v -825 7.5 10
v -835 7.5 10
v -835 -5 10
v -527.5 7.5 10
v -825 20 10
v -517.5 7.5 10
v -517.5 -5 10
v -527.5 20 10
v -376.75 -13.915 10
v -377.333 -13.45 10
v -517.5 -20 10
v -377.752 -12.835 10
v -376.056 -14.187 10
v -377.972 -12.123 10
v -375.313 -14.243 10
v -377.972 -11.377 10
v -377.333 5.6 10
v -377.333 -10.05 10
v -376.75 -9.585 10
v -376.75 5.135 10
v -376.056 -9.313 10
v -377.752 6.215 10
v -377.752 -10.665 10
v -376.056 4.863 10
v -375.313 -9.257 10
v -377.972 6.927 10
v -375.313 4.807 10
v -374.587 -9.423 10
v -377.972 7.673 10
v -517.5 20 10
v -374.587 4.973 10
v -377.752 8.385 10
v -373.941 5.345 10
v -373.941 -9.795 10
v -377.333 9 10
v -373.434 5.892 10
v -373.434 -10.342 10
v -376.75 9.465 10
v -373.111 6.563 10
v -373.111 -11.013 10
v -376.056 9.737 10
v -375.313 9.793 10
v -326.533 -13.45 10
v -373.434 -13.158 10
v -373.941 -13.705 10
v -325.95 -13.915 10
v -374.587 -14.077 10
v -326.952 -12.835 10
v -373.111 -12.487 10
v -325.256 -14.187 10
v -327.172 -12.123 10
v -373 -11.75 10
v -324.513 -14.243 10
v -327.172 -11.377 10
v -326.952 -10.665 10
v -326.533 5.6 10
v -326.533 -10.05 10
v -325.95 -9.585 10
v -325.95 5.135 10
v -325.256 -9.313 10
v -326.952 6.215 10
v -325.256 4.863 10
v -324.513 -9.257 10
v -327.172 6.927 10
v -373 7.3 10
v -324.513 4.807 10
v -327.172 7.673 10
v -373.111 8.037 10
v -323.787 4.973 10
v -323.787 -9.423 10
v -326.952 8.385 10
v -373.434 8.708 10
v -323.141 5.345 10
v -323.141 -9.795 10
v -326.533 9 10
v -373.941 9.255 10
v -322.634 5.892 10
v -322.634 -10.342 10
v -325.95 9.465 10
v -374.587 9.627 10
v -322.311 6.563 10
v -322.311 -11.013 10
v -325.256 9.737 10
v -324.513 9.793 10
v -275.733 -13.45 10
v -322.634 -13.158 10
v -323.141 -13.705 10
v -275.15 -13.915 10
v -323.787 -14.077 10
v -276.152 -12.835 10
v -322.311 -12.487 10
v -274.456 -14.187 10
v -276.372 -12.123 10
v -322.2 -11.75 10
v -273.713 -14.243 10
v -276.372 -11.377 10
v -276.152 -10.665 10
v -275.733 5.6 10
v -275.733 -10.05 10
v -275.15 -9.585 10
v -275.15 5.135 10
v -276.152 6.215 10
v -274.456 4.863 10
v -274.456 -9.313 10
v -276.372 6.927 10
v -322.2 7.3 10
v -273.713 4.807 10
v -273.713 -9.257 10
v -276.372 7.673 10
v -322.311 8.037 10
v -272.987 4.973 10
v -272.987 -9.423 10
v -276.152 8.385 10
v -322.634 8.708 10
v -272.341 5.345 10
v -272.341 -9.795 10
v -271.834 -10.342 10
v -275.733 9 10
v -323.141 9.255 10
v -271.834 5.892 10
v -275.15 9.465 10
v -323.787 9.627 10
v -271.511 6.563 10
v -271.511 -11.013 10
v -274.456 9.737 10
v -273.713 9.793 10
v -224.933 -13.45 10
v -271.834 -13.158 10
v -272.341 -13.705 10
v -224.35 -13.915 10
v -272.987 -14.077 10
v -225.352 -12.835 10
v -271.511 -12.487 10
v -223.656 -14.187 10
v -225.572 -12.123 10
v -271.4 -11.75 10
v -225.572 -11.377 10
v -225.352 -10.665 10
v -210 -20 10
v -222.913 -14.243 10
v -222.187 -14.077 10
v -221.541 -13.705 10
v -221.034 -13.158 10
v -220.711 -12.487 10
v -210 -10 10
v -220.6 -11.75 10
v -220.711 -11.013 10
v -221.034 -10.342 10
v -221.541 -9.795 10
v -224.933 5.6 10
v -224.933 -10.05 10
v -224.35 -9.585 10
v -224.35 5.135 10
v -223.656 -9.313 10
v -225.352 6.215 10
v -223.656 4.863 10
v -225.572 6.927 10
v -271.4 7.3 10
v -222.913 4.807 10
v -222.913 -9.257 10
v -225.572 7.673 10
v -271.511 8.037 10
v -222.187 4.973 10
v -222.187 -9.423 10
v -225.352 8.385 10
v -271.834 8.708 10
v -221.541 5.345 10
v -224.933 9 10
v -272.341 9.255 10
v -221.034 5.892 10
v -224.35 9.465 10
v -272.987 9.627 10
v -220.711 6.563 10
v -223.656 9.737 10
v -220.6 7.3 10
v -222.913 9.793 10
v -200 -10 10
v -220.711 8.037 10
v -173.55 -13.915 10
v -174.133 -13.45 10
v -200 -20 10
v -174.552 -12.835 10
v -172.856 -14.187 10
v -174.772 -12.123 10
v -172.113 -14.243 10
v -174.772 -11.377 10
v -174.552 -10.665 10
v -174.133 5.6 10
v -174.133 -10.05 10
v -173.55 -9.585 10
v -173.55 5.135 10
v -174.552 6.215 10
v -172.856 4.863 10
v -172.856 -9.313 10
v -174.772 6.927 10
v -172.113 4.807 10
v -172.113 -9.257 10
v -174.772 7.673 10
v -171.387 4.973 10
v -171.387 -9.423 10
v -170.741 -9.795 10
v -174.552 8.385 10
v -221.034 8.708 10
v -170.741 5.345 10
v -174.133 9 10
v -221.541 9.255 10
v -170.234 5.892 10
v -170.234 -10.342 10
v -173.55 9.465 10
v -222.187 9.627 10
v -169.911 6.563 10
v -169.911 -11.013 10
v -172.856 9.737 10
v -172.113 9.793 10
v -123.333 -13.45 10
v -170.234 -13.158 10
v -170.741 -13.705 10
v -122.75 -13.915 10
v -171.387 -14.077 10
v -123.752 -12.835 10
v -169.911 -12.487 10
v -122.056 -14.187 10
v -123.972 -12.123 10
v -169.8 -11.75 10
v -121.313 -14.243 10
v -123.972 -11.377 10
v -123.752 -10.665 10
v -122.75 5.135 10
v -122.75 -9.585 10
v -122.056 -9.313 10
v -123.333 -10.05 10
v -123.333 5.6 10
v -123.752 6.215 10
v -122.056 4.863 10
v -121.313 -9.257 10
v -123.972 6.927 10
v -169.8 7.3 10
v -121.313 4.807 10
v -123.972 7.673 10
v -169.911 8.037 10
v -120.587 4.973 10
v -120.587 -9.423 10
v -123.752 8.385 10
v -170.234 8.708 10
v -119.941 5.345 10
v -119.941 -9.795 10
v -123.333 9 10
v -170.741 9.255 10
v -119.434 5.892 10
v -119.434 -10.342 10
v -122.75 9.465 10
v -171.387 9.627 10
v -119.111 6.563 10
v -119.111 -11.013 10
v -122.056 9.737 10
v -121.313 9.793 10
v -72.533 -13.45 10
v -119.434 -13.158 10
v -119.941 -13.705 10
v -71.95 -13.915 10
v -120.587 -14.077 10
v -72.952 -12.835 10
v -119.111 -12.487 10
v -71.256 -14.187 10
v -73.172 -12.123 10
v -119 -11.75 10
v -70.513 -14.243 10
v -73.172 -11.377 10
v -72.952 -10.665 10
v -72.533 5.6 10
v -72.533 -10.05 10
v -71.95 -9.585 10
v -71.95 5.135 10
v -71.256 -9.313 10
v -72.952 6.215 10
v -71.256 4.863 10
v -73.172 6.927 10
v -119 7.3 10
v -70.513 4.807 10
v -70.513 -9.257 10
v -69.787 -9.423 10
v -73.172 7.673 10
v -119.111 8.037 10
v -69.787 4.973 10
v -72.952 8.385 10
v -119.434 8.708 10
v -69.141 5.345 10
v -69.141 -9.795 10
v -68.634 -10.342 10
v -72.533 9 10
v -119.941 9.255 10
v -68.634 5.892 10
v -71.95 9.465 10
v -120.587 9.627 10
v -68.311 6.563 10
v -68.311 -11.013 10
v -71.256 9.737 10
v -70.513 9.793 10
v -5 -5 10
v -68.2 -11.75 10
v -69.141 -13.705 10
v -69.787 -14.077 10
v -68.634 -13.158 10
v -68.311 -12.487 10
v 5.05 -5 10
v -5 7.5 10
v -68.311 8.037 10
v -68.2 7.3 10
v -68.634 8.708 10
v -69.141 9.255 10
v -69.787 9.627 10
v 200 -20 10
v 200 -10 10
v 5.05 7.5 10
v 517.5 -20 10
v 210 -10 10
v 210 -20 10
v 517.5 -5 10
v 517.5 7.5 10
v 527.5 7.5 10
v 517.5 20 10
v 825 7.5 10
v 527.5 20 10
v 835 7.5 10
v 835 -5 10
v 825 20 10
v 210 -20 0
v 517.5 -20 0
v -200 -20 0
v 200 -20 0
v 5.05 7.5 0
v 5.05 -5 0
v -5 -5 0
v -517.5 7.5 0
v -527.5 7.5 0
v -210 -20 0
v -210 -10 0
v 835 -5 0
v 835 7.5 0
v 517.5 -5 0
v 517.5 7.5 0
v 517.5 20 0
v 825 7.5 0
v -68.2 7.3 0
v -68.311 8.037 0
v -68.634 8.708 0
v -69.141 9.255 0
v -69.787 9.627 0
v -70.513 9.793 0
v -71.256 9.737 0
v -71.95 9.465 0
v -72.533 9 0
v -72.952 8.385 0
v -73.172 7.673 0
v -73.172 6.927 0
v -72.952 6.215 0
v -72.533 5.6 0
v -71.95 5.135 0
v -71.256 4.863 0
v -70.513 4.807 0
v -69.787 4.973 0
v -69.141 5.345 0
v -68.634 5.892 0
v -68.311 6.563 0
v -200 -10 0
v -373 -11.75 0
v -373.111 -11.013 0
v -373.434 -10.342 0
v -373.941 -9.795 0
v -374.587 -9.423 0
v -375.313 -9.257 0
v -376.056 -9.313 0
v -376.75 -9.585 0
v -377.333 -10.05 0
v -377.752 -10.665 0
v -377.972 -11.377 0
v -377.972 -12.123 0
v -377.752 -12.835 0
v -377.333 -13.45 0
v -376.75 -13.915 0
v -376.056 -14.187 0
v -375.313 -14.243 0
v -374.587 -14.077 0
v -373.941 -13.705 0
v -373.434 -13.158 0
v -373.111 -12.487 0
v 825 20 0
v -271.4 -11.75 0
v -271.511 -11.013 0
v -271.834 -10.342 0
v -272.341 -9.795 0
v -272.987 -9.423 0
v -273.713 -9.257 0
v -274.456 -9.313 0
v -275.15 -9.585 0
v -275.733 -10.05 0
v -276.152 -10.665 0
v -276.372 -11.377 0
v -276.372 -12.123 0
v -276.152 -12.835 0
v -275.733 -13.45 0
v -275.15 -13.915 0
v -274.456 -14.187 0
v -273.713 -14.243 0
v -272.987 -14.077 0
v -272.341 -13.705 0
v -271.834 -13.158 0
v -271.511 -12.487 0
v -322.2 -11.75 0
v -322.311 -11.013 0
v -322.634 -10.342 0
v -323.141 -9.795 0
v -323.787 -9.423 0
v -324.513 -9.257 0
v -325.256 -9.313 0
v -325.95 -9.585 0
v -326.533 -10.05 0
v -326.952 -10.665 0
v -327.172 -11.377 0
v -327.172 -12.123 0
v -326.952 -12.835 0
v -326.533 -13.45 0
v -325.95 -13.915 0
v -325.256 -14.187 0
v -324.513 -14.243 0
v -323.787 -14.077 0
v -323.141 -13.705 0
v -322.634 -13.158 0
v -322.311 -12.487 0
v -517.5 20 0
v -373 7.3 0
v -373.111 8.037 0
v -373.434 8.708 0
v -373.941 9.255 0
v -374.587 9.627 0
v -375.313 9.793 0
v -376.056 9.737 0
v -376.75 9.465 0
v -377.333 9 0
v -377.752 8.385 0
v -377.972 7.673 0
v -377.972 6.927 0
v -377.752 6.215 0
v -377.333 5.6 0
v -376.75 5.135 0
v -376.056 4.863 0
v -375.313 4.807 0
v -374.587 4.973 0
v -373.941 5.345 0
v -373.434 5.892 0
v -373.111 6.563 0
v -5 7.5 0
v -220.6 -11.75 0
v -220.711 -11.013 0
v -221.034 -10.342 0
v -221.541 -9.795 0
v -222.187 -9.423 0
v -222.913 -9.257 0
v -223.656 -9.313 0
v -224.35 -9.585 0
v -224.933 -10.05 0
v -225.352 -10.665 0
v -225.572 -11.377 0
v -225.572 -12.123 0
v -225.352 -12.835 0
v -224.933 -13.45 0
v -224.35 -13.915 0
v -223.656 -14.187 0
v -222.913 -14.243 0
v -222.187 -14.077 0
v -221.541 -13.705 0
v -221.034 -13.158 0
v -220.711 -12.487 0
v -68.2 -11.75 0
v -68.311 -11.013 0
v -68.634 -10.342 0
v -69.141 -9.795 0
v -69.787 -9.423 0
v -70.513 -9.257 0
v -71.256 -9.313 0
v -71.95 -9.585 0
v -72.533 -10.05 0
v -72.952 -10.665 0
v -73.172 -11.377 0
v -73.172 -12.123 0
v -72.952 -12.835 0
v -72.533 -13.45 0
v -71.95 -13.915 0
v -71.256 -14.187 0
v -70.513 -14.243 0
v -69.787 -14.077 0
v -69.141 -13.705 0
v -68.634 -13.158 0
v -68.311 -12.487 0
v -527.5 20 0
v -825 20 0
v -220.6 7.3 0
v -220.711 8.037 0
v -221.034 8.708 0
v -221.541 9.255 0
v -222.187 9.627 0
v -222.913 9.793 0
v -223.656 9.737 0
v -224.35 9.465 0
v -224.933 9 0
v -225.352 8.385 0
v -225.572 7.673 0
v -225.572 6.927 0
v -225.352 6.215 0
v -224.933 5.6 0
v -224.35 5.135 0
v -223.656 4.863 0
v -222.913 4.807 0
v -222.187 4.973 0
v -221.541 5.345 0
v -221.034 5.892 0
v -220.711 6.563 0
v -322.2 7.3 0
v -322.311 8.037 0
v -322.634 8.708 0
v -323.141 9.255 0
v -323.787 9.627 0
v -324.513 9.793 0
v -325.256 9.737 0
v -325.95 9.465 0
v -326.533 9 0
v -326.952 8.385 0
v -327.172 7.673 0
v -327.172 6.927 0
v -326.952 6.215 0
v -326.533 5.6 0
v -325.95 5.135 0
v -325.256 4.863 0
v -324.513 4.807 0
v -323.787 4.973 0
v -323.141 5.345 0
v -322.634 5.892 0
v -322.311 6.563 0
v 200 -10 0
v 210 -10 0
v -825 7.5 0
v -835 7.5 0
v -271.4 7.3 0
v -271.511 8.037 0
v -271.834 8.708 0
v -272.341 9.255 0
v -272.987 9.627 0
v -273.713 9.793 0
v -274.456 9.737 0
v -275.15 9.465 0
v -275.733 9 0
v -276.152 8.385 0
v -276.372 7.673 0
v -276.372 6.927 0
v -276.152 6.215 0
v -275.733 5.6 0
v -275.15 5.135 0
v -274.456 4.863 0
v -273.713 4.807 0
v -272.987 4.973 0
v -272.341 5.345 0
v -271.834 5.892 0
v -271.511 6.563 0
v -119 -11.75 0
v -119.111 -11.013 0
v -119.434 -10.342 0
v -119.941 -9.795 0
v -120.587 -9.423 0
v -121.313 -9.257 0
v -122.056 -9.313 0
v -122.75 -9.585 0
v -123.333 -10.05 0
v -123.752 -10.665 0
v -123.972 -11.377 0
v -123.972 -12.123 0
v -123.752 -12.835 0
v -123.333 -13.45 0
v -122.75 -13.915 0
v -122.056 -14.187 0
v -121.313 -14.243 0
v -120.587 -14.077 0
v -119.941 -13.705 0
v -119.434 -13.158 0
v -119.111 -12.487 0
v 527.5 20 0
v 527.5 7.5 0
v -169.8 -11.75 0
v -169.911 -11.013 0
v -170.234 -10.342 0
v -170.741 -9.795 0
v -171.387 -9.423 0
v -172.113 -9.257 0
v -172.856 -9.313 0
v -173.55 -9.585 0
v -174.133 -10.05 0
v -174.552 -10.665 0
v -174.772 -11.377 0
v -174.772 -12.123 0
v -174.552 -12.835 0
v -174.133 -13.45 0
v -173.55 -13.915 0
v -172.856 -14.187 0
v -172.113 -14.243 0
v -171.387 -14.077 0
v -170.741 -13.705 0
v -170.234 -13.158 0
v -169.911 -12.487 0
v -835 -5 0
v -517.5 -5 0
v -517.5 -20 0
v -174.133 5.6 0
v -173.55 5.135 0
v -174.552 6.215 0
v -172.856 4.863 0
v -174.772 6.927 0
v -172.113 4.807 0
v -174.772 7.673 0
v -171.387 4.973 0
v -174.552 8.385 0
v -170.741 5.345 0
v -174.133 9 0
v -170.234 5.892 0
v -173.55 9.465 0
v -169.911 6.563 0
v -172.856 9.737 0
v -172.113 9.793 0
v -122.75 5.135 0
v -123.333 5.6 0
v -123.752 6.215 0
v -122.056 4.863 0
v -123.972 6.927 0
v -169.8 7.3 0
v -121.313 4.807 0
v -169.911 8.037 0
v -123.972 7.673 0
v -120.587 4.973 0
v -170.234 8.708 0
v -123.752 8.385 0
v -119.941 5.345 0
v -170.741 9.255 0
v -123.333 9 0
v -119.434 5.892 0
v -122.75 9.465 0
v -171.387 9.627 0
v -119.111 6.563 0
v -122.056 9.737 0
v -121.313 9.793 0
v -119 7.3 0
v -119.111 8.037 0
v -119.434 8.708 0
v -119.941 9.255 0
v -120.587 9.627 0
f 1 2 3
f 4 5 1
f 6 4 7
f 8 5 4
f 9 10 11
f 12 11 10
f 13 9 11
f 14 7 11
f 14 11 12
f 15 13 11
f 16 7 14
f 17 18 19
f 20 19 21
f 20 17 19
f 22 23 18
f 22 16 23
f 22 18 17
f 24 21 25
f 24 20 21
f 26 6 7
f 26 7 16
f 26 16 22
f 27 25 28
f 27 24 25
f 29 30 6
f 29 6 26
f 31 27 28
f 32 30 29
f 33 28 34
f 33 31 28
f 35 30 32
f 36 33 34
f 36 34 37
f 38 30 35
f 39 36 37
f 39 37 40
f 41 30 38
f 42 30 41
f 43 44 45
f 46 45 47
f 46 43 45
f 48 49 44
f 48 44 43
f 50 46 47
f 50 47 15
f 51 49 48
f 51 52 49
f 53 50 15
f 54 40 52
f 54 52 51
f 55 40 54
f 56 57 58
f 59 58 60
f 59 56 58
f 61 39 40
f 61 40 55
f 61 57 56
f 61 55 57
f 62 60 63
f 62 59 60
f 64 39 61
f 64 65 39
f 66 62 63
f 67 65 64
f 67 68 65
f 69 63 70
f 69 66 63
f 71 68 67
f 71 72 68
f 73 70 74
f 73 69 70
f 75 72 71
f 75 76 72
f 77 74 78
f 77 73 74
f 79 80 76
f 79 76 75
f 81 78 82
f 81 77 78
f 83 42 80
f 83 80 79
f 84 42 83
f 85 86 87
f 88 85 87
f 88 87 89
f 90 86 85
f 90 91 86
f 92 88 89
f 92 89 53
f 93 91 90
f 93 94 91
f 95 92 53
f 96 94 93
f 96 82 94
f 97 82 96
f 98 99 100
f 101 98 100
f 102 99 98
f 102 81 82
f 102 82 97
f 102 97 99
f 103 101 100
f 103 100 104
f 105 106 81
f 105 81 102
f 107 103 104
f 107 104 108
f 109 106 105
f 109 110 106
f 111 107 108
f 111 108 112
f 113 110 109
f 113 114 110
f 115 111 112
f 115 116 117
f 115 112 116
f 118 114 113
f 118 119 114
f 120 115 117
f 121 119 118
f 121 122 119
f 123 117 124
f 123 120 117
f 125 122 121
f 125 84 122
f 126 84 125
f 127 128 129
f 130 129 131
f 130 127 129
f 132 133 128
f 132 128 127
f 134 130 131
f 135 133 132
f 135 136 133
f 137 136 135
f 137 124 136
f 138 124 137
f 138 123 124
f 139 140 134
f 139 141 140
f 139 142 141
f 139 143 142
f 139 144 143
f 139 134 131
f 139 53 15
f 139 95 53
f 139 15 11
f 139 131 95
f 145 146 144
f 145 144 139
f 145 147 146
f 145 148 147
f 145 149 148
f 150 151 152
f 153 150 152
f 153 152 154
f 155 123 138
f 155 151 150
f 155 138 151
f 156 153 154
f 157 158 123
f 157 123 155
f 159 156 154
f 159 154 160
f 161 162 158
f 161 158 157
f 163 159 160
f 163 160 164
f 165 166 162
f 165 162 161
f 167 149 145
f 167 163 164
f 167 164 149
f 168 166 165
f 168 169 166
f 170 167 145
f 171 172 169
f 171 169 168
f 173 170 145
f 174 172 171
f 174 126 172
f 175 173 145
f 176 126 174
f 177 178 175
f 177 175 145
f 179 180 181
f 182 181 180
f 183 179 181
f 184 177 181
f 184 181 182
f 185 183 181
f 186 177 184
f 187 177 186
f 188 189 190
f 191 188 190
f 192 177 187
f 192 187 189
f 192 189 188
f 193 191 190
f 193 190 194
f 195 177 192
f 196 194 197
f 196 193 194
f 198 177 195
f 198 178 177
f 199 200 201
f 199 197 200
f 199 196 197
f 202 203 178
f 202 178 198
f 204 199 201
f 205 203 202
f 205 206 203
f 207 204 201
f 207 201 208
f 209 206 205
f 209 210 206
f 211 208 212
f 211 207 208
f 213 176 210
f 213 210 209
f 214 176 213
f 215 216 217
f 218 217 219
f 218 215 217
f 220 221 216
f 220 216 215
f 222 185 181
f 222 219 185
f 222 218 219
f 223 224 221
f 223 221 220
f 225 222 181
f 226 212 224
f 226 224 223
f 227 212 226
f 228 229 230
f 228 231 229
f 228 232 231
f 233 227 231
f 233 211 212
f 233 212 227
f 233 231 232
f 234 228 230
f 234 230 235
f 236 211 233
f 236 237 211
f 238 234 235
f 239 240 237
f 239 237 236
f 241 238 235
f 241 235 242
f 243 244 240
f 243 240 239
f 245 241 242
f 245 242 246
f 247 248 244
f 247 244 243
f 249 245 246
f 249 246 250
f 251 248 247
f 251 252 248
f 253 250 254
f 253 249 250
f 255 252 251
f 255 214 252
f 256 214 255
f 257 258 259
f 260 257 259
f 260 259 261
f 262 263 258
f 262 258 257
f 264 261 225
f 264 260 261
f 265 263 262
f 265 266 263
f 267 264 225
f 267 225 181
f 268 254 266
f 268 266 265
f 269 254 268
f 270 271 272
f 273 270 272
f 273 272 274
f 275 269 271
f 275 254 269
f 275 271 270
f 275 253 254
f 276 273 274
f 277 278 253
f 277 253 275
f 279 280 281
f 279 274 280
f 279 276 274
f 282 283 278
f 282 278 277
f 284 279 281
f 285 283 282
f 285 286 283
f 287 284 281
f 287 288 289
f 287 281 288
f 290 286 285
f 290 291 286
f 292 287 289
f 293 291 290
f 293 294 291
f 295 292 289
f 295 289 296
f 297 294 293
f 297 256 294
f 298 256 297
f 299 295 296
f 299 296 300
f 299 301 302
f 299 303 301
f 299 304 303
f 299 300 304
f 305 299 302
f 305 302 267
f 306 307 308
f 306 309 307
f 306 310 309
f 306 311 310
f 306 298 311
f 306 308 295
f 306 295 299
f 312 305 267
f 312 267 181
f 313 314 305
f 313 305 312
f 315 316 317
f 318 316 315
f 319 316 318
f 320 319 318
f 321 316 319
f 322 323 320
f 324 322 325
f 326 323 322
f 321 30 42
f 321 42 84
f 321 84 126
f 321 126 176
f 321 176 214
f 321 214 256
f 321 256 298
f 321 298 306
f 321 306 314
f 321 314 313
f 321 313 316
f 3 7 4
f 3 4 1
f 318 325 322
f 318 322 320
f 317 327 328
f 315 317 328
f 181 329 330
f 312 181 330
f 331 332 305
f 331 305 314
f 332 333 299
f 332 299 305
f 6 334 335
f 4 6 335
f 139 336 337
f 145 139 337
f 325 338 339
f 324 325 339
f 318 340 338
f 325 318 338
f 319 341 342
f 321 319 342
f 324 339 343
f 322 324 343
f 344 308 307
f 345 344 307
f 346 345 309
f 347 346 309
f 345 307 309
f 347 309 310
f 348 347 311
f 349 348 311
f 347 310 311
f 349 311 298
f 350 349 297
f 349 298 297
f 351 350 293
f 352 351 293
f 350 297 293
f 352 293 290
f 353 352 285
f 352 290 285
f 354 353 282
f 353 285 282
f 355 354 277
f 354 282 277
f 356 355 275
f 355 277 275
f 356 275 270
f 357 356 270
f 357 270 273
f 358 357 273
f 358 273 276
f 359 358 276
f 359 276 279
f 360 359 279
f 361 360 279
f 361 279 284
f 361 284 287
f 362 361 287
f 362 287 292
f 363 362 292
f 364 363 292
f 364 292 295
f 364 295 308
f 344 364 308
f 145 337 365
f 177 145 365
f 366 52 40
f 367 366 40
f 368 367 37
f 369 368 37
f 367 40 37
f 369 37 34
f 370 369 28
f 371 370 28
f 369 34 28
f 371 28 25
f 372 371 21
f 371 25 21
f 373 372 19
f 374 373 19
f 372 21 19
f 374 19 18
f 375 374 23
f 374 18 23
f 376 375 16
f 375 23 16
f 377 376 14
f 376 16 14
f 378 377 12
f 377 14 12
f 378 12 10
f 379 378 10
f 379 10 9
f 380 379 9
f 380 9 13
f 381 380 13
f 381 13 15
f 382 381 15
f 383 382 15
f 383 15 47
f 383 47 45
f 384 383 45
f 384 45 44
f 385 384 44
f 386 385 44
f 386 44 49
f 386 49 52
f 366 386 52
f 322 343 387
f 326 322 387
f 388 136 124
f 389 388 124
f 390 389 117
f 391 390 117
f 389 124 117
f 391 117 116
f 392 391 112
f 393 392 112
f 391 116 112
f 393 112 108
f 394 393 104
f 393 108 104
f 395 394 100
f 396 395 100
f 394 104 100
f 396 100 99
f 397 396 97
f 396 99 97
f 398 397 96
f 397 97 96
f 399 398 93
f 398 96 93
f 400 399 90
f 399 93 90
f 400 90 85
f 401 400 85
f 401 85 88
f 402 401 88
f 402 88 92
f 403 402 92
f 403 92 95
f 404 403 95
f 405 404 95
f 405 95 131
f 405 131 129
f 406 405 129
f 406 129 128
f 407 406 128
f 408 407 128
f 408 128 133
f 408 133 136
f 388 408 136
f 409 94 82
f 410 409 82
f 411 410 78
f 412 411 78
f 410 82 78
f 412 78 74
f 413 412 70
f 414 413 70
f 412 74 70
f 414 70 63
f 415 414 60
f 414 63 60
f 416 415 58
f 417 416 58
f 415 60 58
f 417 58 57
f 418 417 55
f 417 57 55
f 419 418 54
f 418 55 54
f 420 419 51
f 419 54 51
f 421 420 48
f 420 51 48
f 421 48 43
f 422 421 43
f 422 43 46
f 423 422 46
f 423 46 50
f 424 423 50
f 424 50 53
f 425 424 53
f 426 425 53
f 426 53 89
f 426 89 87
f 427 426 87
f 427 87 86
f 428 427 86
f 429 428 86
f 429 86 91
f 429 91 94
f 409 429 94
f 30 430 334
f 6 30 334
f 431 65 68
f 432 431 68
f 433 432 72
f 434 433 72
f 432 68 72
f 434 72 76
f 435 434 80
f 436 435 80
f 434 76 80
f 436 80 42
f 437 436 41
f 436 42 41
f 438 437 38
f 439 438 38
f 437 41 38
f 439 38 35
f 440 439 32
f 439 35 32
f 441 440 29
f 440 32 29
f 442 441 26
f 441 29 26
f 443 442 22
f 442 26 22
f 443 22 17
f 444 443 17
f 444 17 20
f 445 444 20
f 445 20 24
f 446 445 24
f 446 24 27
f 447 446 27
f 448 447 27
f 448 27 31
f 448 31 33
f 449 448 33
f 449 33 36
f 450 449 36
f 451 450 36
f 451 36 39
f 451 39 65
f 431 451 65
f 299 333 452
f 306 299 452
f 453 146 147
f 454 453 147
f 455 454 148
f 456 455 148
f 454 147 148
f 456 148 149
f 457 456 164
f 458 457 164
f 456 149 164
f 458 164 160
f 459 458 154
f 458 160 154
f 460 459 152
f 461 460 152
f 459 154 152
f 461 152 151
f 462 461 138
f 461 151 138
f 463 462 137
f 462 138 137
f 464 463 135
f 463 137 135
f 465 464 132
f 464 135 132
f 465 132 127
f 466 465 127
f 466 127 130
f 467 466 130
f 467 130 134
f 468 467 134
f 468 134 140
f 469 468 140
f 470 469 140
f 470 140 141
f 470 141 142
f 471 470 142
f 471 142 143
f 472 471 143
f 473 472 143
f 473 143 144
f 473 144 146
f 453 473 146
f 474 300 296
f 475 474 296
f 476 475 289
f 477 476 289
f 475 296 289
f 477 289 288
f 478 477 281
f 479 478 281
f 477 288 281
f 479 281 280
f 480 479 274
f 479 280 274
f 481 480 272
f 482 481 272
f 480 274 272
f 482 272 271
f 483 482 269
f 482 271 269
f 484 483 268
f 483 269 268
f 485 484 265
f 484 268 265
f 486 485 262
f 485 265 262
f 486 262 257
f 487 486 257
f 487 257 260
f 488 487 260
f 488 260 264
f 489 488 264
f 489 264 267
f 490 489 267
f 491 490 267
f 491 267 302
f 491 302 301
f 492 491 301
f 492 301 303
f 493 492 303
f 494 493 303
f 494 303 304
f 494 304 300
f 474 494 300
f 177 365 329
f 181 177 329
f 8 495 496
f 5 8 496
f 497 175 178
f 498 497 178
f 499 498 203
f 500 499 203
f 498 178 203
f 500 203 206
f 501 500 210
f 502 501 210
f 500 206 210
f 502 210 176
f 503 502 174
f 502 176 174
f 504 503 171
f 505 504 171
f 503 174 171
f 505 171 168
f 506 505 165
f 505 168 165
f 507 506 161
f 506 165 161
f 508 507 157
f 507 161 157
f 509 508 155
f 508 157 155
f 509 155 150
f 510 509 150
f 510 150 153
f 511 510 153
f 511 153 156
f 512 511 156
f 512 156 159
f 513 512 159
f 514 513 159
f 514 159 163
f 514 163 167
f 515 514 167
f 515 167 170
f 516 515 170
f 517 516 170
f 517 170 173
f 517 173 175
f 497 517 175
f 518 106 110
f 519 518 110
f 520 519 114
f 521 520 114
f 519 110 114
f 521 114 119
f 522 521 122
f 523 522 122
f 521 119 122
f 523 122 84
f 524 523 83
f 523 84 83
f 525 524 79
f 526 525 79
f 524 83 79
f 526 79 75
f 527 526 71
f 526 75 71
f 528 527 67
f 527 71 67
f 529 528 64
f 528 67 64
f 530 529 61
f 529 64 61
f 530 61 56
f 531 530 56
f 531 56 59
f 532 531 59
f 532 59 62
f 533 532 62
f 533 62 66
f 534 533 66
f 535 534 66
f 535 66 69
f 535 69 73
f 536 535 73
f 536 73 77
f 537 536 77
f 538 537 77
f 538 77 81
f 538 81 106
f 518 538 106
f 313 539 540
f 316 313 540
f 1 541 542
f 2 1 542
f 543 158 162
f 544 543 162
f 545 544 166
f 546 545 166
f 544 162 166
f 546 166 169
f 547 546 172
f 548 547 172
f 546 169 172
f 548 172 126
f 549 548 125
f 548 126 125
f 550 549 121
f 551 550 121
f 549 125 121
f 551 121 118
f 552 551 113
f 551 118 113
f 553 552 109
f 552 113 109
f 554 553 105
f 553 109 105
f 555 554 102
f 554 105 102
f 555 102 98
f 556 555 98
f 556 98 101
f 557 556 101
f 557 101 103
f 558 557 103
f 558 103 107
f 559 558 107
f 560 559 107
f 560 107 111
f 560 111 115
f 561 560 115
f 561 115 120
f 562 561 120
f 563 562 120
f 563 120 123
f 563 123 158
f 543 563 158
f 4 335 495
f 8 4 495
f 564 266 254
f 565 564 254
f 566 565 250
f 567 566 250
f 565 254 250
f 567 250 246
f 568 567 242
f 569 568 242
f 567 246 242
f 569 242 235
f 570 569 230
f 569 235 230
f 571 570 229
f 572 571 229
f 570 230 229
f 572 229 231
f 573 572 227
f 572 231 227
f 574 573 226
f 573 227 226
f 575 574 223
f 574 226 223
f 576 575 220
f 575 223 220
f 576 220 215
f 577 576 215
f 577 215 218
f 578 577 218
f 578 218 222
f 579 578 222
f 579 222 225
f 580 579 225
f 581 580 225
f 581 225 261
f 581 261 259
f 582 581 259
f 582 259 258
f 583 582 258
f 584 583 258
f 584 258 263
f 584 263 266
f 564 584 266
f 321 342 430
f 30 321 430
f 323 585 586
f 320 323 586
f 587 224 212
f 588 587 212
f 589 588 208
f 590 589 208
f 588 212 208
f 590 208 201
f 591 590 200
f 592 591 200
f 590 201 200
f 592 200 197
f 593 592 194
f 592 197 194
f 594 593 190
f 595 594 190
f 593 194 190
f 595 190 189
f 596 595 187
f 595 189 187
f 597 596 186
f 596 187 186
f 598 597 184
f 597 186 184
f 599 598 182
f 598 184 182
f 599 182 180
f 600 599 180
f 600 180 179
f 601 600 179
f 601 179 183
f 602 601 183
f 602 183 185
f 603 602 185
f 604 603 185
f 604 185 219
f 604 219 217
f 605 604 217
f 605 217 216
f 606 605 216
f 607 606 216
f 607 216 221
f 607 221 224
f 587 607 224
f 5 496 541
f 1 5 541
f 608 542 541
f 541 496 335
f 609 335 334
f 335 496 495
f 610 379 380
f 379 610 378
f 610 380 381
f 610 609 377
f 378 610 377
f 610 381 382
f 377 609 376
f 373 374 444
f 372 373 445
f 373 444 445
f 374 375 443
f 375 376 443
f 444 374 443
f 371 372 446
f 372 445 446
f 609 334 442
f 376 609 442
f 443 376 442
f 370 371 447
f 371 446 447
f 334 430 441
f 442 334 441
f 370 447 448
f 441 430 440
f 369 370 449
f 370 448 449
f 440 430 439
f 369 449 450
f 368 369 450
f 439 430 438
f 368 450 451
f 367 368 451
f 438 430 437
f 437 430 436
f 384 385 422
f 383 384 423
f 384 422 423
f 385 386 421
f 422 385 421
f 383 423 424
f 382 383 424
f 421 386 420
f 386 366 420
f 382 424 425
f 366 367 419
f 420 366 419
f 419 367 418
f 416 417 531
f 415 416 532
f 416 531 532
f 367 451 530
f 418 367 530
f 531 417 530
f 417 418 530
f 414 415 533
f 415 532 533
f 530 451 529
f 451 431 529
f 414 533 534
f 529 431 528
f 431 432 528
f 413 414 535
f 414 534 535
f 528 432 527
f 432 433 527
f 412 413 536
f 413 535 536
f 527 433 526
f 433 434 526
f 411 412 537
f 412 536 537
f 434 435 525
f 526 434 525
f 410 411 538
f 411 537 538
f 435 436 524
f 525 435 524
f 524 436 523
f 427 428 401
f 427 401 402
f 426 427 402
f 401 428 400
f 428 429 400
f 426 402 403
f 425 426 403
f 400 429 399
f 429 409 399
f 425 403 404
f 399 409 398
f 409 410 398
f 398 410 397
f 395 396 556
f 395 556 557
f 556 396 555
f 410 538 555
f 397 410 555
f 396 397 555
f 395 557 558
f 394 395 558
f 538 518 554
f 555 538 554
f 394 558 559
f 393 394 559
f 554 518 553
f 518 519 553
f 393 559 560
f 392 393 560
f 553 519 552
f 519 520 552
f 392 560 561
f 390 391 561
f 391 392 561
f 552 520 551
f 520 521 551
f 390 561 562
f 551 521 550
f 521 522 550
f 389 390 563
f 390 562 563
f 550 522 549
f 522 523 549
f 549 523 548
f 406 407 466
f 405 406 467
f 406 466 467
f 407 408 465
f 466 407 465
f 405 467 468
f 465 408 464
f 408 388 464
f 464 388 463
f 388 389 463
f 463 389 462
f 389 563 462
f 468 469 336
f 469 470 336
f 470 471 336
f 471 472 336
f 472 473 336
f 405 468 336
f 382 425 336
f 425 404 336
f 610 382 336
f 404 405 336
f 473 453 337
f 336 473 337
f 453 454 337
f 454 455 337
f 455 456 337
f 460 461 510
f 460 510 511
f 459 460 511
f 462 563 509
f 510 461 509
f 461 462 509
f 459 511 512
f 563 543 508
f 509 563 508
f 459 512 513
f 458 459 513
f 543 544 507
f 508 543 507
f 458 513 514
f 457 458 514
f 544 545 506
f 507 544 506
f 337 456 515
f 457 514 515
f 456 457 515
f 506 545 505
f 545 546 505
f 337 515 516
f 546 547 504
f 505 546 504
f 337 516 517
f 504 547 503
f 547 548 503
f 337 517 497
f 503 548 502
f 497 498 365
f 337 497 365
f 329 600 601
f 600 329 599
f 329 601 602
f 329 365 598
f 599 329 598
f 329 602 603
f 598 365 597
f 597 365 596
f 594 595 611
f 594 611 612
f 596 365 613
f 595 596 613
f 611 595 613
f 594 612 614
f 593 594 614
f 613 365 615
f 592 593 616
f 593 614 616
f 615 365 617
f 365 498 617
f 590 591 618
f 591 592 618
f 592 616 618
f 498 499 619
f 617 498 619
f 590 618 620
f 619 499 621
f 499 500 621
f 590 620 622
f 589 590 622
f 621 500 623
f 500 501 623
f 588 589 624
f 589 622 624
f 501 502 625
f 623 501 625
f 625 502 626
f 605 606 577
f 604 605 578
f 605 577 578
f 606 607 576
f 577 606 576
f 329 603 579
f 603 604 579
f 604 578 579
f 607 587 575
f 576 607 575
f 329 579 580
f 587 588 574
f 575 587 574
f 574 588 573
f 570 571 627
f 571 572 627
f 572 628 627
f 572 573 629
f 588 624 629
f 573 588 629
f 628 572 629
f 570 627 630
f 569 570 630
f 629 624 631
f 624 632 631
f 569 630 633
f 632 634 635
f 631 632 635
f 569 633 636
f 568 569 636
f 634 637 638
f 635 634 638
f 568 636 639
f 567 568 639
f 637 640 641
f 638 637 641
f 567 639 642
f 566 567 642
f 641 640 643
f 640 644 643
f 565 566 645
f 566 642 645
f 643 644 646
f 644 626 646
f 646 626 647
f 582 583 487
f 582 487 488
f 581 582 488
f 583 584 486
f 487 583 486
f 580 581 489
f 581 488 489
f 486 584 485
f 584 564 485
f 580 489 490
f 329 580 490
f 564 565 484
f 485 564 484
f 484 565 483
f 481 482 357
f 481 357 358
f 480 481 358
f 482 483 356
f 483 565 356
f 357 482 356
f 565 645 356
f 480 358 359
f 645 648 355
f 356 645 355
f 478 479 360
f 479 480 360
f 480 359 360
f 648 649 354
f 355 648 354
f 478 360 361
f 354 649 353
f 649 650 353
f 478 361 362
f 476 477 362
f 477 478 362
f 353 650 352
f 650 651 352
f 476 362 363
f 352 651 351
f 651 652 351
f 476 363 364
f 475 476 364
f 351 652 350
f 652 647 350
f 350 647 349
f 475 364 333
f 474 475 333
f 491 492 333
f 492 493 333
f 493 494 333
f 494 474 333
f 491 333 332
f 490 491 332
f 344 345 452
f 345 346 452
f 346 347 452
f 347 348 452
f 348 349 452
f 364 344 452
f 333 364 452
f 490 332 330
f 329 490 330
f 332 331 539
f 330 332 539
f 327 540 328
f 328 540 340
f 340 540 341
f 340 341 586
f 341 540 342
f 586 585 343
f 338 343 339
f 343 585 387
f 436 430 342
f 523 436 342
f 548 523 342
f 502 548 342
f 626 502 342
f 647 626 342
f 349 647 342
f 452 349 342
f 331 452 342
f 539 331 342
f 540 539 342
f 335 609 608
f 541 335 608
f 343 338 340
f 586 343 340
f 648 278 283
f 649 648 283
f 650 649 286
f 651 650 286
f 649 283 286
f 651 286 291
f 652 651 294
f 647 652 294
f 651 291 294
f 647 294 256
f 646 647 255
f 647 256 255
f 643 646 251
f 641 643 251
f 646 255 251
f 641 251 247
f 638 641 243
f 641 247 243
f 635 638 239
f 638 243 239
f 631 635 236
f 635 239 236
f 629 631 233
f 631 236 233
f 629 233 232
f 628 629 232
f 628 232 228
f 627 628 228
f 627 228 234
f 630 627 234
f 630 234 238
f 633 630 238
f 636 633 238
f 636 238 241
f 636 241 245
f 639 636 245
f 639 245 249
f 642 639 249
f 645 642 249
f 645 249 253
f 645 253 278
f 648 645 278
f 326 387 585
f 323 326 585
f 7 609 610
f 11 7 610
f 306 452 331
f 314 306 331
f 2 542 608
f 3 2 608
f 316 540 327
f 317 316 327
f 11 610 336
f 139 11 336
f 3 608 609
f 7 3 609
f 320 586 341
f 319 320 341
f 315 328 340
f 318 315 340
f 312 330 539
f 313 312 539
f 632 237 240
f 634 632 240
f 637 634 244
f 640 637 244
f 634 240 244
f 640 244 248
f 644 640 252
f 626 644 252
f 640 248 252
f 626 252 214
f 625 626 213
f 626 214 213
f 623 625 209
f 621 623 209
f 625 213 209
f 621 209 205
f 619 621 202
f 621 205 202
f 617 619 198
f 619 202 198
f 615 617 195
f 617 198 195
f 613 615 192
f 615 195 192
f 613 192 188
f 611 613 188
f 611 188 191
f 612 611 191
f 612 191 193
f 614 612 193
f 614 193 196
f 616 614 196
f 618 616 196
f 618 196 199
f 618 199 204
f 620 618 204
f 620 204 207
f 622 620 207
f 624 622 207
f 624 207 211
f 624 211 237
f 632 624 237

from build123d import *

# Parameters (mm, degrees)
SKETCH1_W           = 10.05
SKETCH1_H           = 12.5
BOSS_EXTRUDE1_DEPTH = 10
SKETCH2_R           = 2.5
CUT_EXTRUDE1_DEPTH  = 836.29934754


with BuildPart() as part:
    # Sketch1 → Boss-Extrude1 (new body)
    with BuildSketch(Plane.XY):
        Polygon((517.5, 20), (-517.5, 20), (-517.5, 7.5), (-527.5, 7.5), (-527.5, 20), (-825, 20), (-825, 7.5), (-835, 7.5), (-835, -5), (-517.5, -5), (-517.5, -20), (-210, -20), (-210, -10), (-200, -10), (-200, -20), (200, -20), (200, -10), (210, -10), (210, -20), (517.5, -20), (517.5, -5), (835, -5), (835, 7.5), (825, 7.5), (825, 20), (527.5, 20), (527.5, 7.5), (517.5, 7.5), align=None)
        with Locations((0.025, 1.25)):
            Rectangle(SKETCH1_W, SKETCH1_H, mode=Mode.SUBTRACT)
    extrude(amount=BOSS_EXTRUDE1_DEPTH)

    # Sketch2 → Cut-Extrude1 (cut, through all)
    with BuildSketch(Plane.XY.offset(10)):
        with Locations((-375.5, 7.3)):
            Circle(SKETCH2_R)
        with Locations((-375.5, -11.75)):
            Circle(SKETCH2_R)
        with Locations((-324.7, -11.75)):
            Circle(SKETCH2_R)
        with Locations((-324.7, 7.3)):
            Circle(SKETCH2_R)
        with Locations((-273.9, 7.3)):
            Circle(SKETCH2_R)
        with Locations((-273.9, -11.75)):
            Circle(SKETCH2_R)
        with Locations((-223.1, -11.75)):
            Circle(SKETCH2_R)
        with Locations((-223.1, 7.3)):
            Circle(SKETCH2_R)
        with Locations((-172.3, 7.3)):
            Circle(SKETCH2_R)
        with Locations((-121.5, -11.75)):
            Circle(SKETCH2_R)
        with Locations((-121.5, 7.3)):
            Circle(SKETCH2_R)
        with Locations((-70.7, 7.3)):
            Circle(SKETCH2_R)
        with Locations((-70.7, -11.75)):
            Circle(SKETCH2_R)
        with Locations((-172.3, -11.75)):
            Circle(SKETCH2_R)
    extrude(amount=-CUT_EXTRUDE1_DEPTH, mode=Mode.SUBTRACT)


solid = part.part
